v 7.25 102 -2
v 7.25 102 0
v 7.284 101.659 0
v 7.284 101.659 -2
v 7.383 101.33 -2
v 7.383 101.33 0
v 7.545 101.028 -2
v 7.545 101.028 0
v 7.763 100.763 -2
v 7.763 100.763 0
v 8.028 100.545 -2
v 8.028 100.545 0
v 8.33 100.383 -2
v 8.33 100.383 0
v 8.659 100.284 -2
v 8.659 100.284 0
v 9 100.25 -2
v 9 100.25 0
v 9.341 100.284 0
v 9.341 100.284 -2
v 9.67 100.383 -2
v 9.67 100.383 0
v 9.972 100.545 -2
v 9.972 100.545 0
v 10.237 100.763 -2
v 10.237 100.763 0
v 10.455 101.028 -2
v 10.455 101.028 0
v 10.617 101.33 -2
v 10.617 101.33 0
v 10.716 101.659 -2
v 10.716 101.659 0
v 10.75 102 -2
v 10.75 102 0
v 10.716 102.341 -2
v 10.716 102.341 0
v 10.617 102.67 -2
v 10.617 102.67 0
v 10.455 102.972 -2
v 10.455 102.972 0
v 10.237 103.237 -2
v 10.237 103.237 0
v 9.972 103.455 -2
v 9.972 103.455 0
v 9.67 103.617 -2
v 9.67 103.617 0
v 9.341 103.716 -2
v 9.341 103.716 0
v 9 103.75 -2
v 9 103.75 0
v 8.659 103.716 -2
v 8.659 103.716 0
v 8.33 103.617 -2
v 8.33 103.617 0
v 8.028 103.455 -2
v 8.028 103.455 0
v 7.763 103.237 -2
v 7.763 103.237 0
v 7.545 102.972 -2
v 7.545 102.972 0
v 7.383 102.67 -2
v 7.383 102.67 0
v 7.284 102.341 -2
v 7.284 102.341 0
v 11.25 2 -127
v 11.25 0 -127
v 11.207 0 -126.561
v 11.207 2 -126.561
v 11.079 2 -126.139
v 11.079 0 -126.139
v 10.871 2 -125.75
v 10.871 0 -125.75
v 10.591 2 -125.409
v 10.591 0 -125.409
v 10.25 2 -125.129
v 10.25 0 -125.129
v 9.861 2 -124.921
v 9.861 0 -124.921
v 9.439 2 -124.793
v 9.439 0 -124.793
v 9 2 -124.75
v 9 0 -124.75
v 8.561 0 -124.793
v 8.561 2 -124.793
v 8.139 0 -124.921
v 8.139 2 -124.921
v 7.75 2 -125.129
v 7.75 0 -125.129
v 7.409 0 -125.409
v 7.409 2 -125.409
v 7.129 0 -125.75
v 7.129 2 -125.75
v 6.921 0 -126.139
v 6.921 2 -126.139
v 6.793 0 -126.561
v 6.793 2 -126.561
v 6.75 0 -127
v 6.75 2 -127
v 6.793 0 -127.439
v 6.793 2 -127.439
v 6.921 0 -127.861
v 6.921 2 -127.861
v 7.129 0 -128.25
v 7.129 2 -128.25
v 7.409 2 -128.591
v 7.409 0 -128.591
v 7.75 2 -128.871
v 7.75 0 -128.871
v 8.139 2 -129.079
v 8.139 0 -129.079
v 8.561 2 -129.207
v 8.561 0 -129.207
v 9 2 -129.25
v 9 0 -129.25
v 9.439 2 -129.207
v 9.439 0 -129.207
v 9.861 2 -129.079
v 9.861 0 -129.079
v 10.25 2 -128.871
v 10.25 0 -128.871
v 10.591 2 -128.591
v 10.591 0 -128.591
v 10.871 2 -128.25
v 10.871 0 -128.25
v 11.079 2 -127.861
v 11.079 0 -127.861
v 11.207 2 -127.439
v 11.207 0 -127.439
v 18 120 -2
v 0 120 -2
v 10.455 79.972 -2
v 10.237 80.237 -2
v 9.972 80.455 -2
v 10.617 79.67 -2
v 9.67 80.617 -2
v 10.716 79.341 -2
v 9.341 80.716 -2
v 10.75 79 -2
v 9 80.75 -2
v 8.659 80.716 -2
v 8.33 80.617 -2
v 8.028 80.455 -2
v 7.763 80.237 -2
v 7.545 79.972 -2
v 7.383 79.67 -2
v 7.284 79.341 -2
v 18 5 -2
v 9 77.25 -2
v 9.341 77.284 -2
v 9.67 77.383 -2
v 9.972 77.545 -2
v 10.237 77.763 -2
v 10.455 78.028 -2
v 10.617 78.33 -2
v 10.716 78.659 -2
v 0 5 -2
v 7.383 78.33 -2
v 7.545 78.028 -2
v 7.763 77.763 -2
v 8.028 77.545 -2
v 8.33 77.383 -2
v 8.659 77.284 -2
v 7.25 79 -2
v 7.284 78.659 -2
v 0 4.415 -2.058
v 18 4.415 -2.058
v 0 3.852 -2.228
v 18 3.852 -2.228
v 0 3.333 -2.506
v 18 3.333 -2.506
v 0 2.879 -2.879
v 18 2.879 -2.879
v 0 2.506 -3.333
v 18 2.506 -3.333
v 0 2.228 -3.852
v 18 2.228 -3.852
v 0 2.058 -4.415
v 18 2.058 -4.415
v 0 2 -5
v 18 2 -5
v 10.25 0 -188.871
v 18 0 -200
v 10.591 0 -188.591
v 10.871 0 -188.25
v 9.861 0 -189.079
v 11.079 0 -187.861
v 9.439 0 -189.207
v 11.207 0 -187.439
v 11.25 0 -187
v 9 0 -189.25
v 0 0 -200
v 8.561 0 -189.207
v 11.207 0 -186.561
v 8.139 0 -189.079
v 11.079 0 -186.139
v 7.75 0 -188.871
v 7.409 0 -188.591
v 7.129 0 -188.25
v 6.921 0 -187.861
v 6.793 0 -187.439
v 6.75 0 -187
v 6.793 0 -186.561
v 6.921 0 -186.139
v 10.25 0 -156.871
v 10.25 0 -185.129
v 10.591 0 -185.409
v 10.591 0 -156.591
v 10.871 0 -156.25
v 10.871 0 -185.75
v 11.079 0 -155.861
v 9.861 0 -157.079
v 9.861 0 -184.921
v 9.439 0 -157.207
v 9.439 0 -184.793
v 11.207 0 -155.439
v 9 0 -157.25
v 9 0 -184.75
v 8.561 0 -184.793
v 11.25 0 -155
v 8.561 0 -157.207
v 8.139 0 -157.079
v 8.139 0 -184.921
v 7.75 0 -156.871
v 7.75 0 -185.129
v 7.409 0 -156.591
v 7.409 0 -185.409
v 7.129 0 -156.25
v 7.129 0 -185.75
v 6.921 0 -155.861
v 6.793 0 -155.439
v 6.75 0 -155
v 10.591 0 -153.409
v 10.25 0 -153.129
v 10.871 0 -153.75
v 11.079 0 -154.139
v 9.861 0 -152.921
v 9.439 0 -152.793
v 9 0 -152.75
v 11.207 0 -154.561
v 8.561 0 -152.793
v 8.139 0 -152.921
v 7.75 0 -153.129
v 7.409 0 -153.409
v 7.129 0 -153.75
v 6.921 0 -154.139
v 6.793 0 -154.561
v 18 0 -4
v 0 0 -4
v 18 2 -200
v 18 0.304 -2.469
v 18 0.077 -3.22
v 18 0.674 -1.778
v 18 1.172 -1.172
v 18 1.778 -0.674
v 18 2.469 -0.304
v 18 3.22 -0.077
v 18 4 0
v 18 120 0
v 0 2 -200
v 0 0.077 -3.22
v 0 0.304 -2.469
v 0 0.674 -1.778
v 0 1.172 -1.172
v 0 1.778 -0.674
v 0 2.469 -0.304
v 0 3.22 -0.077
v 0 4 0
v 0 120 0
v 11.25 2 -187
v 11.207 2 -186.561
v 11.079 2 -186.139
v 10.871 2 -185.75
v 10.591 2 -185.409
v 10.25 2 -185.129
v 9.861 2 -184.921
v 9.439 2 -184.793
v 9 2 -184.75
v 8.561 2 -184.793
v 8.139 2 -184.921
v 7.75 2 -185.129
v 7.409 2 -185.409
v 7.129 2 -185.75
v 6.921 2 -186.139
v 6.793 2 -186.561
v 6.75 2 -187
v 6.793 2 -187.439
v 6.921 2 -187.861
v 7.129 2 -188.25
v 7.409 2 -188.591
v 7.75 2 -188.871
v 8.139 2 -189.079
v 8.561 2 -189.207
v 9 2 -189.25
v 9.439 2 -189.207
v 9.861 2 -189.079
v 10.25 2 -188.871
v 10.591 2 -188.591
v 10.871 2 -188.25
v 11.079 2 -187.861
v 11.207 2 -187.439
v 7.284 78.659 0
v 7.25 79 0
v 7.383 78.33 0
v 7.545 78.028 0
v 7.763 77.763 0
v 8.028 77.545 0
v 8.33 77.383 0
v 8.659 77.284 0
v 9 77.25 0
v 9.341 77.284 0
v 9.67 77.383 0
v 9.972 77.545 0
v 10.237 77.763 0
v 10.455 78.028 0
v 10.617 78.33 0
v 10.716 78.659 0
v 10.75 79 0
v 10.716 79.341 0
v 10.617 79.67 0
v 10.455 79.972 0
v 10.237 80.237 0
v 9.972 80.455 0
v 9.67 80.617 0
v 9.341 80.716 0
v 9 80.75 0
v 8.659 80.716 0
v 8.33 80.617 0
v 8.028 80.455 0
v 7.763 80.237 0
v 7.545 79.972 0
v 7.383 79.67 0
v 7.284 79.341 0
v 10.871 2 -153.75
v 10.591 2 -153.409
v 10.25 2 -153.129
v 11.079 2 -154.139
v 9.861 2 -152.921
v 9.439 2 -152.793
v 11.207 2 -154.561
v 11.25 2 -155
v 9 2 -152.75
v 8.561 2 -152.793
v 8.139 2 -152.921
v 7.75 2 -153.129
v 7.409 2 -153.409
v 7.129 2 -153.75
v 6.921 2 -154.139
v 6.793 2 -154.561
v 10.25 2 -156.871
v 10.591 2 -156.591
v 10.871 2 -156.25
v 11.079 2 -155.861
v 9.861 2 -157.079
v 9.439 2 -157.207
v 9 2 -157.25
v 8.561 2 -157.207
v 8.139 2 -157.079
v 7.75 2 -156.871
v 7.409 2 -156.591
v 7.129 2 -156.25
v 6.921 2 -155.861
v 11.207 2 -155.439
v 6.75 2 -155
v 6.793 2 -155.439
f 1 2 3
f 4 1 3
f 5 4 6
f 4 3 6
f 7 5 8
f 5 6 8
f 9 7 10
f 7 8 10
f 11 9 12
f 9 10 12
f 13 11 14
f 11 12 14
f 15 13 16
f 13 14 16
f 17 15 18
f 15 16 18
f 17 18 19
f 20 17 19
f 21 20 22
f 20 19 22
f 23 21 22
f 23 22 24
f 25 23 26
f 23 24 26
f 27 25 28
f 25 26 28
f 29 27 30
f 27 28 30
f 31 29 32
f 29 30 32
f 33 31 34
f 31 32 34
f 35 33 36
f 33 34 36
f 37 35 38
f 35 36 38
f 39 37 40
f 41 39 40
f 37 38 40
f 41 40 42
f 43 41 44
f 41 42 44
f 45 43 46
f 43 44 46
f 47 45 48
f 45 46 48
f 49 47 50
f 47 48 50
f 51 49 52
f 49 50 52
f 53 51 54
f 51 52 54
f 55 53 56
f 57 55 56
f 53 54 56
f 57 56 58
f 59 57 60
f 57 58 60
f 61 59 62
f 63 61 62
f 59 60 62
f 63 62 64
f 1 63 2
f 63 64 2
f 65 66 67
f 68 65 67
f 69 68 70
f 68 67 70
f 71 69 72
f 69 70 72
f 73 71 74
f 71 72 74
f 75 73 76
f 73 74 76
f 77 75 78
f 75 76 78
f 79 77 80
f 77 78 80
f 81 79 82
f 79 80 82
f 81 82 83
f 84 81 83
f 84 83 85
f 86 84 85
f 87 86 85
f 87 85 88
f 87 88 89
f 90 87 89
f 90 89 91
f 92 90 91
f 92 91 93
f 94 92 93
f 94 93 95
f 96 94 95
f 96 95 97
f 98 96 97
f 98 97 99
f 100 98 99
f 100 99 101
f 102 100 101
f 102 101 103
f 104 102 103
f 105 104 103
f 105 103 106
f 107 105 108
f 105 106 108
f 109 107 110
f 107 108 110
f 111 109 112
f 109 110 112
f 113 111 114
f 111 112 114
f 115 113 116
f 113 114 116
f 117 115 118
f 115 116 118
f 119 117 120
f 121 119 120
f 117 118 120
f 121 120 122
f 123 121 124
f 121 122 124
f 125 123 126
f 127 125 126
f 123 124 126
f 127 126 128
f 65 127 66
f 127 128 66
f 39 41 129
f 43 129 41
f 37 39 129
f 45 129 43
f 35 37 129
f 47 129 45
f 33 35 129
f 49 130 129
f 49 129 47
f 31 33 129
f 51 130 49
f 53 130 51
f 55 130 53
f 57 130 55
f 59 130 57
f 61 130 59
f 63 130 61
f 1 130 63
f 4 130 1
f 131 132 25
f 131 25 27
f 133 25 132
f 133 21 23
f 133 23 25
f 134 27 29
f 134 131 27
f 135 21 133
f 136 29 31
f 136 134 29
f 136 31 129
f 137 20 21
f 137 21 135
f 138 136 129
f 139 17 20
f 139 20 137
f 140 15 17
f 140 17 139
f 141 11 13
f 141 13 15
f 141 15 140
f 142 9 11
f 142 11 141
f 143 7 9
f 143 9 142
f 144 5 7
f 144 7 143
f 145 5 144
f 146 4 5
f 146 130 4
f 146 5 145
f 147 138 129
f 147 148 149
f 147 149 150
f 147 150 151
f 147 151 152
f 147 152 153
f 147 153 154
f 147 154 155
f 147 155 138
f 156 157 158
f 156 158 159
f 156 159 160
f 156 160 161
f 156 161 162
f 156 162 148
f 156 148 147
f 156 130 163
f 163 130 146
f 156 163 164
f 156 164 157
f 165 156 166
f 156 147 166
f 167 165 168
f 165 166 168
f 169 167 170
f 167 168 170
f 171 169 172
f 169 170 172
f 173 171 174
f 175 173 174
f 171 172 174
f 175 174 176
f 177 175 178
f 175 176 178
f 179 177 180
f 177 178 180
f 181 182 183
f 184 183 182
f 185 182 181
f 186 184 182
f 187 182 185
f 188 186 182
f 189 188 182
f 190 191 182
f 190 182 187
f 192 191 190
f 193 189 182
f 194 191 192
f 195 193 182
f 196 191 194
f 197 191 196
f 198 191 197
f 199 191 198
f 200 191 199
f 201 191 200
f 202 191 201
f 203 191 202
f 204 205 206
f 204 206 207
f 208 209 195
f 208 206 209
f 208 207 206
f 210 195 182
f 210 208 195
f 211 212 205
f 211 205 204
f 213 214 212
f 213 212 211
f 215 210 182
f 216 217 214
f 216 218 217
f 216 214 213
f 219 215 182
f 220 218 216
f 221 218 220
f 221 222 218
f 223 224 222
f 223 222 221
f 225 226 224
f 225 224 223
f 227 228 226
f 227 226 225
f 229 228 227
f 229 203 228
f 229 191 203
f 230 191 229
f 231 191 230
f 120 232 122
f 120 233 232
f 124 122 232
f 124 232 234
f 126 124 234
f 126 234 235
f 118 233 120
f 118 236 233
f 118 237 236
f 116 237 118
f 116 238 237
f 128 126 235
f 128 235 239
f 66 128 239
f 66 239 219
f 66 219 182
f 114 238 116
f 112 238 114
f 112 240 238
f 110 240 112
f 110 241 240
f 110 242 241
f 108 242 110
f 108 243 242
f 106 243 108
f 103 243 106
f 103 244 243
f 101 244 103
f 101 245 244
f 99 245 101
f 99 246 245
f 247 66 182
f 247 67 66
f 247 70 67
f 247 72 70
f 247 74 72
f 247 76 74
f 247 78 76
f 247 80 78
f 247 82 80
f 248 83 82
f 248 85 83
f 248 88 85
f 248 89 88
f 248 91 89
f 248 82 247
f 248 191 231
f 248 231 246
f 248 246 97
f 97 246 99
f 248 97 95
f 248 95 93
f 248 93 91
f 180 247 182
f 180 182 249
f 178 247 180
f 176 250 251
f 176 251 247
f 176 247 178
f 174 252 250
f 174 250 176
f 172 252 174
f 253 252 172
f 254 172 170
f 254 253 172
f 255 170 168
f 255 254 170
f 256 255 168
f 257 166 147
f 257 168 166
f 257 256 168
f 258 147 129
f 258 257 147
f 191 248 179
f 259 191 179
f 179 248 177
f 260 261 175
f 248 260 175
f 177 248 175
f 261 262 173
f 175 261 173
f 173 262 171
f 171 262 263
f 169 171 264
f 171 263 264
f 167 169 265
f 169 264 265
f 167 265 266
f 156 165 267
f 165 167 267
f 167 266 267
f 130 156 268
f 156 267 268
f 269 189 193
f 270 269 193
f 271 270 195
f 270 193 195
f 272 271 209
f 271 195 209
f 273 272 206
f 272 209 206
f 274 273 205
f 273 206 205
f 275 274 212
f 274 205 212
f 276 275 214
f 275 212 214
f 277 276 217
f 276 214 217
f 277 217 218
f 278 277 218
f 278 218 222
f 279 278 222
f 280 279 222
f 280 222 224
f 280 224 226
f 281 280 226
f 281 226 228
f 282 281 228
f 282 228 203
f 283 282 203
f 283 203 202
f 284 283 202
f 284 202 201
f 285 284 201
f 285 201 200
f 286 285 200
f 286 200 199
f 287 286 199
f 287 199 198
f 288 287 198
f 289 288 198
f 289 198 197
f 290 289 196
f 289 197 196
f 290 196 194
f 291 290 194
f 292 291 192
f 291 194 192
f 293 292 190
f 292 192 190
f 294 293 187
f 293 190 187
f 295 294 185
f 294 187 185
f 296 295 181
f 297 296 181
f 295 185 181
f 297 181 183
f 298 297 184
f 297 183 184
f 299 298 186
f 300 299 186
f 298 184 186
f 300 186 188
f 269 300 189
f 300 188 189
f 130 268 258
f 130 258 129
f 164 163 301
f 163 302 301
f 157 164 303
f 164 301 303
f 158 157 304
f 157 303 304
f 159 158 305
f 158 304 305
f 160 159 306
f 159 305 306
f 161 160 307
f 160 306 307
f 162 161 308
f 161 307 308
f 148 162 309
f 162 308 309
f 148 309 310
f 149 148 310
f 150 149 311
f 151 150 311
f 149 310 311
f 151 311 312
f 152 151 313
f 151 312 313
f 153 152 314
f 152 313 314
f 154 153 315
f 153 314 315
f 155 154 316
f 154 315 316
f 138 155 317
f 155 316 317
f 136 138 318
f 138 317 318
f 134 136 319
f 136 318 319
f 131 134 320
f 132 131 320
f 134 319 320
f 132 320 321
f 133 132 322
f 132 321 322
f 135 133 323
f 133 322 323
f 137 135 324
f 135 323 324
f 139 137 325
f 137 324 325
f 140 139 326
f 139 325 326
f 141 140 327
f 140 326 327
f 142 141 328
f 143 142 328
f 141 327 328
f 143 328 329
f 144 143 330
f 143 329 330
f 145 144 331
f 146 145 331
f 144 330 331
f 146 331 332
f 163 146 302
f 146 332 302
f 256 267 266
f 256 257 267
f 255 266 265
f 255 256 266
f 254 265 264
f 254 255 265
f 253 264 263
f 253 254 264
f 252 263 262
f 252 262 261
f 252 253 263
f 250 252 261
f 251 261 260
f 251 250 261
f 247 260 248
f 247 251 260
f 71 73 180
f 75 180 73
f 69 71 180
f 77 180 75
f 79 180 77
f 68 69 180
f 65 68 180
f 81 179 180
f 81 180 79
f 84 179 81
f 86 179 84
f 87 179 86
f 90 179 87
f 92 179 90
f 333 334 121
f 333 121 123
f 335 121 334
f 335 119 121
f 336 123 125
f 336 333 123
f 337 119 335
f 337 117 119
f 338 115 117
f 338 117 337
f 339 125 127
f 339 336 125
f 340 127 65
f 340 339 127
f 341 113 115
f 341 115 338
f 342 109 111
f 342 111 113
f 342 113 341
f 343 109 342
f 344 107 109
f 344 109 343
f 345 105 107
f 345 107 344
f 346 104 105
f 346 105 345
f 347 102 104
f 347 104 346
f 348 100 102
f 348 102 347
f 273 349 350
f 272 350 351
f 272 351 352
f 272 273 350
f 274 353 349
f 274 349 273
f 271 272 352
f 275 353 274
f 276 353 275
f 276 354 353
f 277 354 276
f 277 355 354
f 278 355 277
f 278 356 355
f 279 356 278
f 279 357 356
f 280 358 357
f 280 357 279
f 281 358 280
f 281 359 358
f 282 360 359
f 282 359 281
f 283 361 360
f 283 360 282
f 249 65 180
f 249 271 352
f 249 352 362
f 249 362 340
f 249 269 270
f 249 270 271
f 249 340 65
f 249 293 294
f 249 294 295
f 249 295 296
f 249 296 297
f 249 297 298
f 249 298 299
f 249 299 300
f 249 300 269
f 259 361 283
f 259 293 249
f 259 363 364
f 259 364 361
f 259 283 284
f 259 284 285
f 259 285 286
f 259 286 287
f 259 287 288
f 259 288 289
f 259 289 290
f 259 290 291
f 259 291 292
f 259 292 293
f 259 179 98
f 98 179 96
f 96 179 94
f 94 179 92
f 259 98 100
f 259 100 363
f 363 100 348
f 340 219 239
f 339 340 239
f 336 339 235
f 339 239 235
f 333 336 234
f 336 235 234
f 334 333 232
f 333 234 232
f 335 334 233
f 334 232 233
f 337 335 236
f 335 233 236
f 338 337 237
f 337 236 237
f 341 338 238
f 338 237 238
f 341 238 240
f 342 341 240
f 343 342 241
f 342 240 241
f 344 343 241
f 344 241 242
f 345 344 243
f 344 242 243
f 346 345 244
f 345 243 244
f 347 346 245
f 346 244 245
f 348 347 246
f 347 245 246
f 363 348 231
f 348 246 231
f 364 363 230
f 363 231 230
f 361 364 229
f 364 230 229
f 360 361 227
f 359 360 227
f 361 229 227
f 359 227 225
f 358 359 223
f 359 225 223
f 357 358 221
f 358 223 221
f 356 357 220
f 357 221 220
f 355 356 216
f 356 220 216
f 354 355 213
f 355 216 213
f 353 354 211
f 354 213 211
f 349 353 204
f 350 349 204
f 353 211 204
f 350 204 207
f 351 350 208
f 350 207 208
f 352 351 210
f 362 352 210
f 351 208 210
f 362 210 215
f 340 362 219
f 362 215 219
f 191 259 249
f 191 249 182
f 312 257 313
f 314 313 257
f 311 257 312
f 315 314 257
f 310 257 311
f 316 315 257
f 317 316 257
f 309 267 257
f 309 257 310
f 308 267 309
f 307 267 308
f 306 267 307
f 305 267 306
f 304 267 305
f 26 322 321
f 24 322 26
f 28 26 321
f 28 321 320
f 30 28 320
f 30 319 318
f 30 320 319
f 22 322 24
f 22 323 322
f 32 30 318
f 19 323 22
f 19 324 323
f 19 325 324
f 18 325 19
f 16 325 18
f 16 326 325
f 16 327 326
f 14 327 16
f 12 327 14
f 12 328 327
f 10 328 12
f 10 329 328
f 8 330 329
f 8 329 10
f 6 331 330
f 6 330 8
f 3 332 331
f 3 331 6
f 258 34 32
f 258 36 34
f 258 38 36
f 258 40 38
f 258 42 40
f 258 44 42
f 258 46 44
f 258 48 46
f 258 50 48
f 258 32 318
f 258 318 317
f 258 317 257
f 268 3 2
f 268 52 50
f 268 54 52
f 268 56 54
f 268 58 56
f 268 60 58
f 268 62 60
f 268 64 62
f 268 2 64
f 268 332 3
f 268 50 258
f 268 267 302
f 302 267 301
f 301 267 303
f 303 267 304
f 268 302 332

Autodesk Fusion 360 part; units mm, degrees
sketch "Bracket" plane through (0, 0, 0) normal (1, 0, 0) x (0, 1, 0)
  line L0 (0, 0) -> (2, 0)
  line L1 (2, -2) -> (2, -200)
  line L2 (2, -200) -> (0, -200)
  line L3 (0, -200) -> (0, 0)
  line L4 (0, 0) -> (120, 0)
  line L5 (120, 0) -> (120, -2)
  line L6 (120, -2) -> (2, -2)
  line L7 (0, -2) -> (0, 0)
  dimension "d1" = 2
  dimension "d2" = 200
  dimension "d3" = 120
  dimension "d4" = 2
extrude "Extrude1" add sketch "Bracket" along normal blind 18
fillet "Fillet1" radius 3 1 edges at (9, 2, -2)
fillet "Fillet2" radius 4 1 edges at (9, 0, 0)
sketch "Front Holes" plane through (0, 0, 0) normal (0, -1, 0) x (1, 0, 0)
  line L0 (18, -4) -> (0, -4)
  line L1 (0, -4) -> (0, -200)
  line L2 (0, -200) -> (18, -200)
  line L3 (18, -200) -> (18, -4)
  line L4 (9, -200) -> (9, -113.9355) construction
  circle A0 centre (9, -187) radius 2.25
  circle A1 centre (9, -155) radius 2.25
  circle A2 centre (9, -127) radius 2.25
  dimension "d9" = 4.5
  dimension "d10" = 4.5
  dimension "d11" = 4.5
  dimension "d12" = 13
  dimension "d13" = 32
  dimension "d14" = 28
sketch "Top Holes" plane through (0, 0, 0) normal (0, 0, 1) x (-1, 0, 0)
  line L0 (0, -4) -> (-18, -4)
  line L1 (-18, -4) -> (-18, -120)
  line L2 (-18, -120) -> (0, -120)
  line L3 (0, -120) -> (0, -4)
  line L4 (-9, -120) -> (-9, -16.6564) construction
  circle A0 centre (-9, -102) radius 1.75
  circle A1 centre (-9, -79) radius 1.75
  dimension "d15" = 3.5
  dimension "d16" = 3.5
  dimension "d17" = 18
  dimension "d18" = 23
extrude "Extrude2" cut sketch "Front Holes" against normal blind 5 contours A0 | A1 | A2
extrude "Extrude3" cut sketch "Top Holes" against normal blind 5 contours A0 | A1
equation "d10 = d9"
equation "d11 = d9"
equation "d16 = d15"
